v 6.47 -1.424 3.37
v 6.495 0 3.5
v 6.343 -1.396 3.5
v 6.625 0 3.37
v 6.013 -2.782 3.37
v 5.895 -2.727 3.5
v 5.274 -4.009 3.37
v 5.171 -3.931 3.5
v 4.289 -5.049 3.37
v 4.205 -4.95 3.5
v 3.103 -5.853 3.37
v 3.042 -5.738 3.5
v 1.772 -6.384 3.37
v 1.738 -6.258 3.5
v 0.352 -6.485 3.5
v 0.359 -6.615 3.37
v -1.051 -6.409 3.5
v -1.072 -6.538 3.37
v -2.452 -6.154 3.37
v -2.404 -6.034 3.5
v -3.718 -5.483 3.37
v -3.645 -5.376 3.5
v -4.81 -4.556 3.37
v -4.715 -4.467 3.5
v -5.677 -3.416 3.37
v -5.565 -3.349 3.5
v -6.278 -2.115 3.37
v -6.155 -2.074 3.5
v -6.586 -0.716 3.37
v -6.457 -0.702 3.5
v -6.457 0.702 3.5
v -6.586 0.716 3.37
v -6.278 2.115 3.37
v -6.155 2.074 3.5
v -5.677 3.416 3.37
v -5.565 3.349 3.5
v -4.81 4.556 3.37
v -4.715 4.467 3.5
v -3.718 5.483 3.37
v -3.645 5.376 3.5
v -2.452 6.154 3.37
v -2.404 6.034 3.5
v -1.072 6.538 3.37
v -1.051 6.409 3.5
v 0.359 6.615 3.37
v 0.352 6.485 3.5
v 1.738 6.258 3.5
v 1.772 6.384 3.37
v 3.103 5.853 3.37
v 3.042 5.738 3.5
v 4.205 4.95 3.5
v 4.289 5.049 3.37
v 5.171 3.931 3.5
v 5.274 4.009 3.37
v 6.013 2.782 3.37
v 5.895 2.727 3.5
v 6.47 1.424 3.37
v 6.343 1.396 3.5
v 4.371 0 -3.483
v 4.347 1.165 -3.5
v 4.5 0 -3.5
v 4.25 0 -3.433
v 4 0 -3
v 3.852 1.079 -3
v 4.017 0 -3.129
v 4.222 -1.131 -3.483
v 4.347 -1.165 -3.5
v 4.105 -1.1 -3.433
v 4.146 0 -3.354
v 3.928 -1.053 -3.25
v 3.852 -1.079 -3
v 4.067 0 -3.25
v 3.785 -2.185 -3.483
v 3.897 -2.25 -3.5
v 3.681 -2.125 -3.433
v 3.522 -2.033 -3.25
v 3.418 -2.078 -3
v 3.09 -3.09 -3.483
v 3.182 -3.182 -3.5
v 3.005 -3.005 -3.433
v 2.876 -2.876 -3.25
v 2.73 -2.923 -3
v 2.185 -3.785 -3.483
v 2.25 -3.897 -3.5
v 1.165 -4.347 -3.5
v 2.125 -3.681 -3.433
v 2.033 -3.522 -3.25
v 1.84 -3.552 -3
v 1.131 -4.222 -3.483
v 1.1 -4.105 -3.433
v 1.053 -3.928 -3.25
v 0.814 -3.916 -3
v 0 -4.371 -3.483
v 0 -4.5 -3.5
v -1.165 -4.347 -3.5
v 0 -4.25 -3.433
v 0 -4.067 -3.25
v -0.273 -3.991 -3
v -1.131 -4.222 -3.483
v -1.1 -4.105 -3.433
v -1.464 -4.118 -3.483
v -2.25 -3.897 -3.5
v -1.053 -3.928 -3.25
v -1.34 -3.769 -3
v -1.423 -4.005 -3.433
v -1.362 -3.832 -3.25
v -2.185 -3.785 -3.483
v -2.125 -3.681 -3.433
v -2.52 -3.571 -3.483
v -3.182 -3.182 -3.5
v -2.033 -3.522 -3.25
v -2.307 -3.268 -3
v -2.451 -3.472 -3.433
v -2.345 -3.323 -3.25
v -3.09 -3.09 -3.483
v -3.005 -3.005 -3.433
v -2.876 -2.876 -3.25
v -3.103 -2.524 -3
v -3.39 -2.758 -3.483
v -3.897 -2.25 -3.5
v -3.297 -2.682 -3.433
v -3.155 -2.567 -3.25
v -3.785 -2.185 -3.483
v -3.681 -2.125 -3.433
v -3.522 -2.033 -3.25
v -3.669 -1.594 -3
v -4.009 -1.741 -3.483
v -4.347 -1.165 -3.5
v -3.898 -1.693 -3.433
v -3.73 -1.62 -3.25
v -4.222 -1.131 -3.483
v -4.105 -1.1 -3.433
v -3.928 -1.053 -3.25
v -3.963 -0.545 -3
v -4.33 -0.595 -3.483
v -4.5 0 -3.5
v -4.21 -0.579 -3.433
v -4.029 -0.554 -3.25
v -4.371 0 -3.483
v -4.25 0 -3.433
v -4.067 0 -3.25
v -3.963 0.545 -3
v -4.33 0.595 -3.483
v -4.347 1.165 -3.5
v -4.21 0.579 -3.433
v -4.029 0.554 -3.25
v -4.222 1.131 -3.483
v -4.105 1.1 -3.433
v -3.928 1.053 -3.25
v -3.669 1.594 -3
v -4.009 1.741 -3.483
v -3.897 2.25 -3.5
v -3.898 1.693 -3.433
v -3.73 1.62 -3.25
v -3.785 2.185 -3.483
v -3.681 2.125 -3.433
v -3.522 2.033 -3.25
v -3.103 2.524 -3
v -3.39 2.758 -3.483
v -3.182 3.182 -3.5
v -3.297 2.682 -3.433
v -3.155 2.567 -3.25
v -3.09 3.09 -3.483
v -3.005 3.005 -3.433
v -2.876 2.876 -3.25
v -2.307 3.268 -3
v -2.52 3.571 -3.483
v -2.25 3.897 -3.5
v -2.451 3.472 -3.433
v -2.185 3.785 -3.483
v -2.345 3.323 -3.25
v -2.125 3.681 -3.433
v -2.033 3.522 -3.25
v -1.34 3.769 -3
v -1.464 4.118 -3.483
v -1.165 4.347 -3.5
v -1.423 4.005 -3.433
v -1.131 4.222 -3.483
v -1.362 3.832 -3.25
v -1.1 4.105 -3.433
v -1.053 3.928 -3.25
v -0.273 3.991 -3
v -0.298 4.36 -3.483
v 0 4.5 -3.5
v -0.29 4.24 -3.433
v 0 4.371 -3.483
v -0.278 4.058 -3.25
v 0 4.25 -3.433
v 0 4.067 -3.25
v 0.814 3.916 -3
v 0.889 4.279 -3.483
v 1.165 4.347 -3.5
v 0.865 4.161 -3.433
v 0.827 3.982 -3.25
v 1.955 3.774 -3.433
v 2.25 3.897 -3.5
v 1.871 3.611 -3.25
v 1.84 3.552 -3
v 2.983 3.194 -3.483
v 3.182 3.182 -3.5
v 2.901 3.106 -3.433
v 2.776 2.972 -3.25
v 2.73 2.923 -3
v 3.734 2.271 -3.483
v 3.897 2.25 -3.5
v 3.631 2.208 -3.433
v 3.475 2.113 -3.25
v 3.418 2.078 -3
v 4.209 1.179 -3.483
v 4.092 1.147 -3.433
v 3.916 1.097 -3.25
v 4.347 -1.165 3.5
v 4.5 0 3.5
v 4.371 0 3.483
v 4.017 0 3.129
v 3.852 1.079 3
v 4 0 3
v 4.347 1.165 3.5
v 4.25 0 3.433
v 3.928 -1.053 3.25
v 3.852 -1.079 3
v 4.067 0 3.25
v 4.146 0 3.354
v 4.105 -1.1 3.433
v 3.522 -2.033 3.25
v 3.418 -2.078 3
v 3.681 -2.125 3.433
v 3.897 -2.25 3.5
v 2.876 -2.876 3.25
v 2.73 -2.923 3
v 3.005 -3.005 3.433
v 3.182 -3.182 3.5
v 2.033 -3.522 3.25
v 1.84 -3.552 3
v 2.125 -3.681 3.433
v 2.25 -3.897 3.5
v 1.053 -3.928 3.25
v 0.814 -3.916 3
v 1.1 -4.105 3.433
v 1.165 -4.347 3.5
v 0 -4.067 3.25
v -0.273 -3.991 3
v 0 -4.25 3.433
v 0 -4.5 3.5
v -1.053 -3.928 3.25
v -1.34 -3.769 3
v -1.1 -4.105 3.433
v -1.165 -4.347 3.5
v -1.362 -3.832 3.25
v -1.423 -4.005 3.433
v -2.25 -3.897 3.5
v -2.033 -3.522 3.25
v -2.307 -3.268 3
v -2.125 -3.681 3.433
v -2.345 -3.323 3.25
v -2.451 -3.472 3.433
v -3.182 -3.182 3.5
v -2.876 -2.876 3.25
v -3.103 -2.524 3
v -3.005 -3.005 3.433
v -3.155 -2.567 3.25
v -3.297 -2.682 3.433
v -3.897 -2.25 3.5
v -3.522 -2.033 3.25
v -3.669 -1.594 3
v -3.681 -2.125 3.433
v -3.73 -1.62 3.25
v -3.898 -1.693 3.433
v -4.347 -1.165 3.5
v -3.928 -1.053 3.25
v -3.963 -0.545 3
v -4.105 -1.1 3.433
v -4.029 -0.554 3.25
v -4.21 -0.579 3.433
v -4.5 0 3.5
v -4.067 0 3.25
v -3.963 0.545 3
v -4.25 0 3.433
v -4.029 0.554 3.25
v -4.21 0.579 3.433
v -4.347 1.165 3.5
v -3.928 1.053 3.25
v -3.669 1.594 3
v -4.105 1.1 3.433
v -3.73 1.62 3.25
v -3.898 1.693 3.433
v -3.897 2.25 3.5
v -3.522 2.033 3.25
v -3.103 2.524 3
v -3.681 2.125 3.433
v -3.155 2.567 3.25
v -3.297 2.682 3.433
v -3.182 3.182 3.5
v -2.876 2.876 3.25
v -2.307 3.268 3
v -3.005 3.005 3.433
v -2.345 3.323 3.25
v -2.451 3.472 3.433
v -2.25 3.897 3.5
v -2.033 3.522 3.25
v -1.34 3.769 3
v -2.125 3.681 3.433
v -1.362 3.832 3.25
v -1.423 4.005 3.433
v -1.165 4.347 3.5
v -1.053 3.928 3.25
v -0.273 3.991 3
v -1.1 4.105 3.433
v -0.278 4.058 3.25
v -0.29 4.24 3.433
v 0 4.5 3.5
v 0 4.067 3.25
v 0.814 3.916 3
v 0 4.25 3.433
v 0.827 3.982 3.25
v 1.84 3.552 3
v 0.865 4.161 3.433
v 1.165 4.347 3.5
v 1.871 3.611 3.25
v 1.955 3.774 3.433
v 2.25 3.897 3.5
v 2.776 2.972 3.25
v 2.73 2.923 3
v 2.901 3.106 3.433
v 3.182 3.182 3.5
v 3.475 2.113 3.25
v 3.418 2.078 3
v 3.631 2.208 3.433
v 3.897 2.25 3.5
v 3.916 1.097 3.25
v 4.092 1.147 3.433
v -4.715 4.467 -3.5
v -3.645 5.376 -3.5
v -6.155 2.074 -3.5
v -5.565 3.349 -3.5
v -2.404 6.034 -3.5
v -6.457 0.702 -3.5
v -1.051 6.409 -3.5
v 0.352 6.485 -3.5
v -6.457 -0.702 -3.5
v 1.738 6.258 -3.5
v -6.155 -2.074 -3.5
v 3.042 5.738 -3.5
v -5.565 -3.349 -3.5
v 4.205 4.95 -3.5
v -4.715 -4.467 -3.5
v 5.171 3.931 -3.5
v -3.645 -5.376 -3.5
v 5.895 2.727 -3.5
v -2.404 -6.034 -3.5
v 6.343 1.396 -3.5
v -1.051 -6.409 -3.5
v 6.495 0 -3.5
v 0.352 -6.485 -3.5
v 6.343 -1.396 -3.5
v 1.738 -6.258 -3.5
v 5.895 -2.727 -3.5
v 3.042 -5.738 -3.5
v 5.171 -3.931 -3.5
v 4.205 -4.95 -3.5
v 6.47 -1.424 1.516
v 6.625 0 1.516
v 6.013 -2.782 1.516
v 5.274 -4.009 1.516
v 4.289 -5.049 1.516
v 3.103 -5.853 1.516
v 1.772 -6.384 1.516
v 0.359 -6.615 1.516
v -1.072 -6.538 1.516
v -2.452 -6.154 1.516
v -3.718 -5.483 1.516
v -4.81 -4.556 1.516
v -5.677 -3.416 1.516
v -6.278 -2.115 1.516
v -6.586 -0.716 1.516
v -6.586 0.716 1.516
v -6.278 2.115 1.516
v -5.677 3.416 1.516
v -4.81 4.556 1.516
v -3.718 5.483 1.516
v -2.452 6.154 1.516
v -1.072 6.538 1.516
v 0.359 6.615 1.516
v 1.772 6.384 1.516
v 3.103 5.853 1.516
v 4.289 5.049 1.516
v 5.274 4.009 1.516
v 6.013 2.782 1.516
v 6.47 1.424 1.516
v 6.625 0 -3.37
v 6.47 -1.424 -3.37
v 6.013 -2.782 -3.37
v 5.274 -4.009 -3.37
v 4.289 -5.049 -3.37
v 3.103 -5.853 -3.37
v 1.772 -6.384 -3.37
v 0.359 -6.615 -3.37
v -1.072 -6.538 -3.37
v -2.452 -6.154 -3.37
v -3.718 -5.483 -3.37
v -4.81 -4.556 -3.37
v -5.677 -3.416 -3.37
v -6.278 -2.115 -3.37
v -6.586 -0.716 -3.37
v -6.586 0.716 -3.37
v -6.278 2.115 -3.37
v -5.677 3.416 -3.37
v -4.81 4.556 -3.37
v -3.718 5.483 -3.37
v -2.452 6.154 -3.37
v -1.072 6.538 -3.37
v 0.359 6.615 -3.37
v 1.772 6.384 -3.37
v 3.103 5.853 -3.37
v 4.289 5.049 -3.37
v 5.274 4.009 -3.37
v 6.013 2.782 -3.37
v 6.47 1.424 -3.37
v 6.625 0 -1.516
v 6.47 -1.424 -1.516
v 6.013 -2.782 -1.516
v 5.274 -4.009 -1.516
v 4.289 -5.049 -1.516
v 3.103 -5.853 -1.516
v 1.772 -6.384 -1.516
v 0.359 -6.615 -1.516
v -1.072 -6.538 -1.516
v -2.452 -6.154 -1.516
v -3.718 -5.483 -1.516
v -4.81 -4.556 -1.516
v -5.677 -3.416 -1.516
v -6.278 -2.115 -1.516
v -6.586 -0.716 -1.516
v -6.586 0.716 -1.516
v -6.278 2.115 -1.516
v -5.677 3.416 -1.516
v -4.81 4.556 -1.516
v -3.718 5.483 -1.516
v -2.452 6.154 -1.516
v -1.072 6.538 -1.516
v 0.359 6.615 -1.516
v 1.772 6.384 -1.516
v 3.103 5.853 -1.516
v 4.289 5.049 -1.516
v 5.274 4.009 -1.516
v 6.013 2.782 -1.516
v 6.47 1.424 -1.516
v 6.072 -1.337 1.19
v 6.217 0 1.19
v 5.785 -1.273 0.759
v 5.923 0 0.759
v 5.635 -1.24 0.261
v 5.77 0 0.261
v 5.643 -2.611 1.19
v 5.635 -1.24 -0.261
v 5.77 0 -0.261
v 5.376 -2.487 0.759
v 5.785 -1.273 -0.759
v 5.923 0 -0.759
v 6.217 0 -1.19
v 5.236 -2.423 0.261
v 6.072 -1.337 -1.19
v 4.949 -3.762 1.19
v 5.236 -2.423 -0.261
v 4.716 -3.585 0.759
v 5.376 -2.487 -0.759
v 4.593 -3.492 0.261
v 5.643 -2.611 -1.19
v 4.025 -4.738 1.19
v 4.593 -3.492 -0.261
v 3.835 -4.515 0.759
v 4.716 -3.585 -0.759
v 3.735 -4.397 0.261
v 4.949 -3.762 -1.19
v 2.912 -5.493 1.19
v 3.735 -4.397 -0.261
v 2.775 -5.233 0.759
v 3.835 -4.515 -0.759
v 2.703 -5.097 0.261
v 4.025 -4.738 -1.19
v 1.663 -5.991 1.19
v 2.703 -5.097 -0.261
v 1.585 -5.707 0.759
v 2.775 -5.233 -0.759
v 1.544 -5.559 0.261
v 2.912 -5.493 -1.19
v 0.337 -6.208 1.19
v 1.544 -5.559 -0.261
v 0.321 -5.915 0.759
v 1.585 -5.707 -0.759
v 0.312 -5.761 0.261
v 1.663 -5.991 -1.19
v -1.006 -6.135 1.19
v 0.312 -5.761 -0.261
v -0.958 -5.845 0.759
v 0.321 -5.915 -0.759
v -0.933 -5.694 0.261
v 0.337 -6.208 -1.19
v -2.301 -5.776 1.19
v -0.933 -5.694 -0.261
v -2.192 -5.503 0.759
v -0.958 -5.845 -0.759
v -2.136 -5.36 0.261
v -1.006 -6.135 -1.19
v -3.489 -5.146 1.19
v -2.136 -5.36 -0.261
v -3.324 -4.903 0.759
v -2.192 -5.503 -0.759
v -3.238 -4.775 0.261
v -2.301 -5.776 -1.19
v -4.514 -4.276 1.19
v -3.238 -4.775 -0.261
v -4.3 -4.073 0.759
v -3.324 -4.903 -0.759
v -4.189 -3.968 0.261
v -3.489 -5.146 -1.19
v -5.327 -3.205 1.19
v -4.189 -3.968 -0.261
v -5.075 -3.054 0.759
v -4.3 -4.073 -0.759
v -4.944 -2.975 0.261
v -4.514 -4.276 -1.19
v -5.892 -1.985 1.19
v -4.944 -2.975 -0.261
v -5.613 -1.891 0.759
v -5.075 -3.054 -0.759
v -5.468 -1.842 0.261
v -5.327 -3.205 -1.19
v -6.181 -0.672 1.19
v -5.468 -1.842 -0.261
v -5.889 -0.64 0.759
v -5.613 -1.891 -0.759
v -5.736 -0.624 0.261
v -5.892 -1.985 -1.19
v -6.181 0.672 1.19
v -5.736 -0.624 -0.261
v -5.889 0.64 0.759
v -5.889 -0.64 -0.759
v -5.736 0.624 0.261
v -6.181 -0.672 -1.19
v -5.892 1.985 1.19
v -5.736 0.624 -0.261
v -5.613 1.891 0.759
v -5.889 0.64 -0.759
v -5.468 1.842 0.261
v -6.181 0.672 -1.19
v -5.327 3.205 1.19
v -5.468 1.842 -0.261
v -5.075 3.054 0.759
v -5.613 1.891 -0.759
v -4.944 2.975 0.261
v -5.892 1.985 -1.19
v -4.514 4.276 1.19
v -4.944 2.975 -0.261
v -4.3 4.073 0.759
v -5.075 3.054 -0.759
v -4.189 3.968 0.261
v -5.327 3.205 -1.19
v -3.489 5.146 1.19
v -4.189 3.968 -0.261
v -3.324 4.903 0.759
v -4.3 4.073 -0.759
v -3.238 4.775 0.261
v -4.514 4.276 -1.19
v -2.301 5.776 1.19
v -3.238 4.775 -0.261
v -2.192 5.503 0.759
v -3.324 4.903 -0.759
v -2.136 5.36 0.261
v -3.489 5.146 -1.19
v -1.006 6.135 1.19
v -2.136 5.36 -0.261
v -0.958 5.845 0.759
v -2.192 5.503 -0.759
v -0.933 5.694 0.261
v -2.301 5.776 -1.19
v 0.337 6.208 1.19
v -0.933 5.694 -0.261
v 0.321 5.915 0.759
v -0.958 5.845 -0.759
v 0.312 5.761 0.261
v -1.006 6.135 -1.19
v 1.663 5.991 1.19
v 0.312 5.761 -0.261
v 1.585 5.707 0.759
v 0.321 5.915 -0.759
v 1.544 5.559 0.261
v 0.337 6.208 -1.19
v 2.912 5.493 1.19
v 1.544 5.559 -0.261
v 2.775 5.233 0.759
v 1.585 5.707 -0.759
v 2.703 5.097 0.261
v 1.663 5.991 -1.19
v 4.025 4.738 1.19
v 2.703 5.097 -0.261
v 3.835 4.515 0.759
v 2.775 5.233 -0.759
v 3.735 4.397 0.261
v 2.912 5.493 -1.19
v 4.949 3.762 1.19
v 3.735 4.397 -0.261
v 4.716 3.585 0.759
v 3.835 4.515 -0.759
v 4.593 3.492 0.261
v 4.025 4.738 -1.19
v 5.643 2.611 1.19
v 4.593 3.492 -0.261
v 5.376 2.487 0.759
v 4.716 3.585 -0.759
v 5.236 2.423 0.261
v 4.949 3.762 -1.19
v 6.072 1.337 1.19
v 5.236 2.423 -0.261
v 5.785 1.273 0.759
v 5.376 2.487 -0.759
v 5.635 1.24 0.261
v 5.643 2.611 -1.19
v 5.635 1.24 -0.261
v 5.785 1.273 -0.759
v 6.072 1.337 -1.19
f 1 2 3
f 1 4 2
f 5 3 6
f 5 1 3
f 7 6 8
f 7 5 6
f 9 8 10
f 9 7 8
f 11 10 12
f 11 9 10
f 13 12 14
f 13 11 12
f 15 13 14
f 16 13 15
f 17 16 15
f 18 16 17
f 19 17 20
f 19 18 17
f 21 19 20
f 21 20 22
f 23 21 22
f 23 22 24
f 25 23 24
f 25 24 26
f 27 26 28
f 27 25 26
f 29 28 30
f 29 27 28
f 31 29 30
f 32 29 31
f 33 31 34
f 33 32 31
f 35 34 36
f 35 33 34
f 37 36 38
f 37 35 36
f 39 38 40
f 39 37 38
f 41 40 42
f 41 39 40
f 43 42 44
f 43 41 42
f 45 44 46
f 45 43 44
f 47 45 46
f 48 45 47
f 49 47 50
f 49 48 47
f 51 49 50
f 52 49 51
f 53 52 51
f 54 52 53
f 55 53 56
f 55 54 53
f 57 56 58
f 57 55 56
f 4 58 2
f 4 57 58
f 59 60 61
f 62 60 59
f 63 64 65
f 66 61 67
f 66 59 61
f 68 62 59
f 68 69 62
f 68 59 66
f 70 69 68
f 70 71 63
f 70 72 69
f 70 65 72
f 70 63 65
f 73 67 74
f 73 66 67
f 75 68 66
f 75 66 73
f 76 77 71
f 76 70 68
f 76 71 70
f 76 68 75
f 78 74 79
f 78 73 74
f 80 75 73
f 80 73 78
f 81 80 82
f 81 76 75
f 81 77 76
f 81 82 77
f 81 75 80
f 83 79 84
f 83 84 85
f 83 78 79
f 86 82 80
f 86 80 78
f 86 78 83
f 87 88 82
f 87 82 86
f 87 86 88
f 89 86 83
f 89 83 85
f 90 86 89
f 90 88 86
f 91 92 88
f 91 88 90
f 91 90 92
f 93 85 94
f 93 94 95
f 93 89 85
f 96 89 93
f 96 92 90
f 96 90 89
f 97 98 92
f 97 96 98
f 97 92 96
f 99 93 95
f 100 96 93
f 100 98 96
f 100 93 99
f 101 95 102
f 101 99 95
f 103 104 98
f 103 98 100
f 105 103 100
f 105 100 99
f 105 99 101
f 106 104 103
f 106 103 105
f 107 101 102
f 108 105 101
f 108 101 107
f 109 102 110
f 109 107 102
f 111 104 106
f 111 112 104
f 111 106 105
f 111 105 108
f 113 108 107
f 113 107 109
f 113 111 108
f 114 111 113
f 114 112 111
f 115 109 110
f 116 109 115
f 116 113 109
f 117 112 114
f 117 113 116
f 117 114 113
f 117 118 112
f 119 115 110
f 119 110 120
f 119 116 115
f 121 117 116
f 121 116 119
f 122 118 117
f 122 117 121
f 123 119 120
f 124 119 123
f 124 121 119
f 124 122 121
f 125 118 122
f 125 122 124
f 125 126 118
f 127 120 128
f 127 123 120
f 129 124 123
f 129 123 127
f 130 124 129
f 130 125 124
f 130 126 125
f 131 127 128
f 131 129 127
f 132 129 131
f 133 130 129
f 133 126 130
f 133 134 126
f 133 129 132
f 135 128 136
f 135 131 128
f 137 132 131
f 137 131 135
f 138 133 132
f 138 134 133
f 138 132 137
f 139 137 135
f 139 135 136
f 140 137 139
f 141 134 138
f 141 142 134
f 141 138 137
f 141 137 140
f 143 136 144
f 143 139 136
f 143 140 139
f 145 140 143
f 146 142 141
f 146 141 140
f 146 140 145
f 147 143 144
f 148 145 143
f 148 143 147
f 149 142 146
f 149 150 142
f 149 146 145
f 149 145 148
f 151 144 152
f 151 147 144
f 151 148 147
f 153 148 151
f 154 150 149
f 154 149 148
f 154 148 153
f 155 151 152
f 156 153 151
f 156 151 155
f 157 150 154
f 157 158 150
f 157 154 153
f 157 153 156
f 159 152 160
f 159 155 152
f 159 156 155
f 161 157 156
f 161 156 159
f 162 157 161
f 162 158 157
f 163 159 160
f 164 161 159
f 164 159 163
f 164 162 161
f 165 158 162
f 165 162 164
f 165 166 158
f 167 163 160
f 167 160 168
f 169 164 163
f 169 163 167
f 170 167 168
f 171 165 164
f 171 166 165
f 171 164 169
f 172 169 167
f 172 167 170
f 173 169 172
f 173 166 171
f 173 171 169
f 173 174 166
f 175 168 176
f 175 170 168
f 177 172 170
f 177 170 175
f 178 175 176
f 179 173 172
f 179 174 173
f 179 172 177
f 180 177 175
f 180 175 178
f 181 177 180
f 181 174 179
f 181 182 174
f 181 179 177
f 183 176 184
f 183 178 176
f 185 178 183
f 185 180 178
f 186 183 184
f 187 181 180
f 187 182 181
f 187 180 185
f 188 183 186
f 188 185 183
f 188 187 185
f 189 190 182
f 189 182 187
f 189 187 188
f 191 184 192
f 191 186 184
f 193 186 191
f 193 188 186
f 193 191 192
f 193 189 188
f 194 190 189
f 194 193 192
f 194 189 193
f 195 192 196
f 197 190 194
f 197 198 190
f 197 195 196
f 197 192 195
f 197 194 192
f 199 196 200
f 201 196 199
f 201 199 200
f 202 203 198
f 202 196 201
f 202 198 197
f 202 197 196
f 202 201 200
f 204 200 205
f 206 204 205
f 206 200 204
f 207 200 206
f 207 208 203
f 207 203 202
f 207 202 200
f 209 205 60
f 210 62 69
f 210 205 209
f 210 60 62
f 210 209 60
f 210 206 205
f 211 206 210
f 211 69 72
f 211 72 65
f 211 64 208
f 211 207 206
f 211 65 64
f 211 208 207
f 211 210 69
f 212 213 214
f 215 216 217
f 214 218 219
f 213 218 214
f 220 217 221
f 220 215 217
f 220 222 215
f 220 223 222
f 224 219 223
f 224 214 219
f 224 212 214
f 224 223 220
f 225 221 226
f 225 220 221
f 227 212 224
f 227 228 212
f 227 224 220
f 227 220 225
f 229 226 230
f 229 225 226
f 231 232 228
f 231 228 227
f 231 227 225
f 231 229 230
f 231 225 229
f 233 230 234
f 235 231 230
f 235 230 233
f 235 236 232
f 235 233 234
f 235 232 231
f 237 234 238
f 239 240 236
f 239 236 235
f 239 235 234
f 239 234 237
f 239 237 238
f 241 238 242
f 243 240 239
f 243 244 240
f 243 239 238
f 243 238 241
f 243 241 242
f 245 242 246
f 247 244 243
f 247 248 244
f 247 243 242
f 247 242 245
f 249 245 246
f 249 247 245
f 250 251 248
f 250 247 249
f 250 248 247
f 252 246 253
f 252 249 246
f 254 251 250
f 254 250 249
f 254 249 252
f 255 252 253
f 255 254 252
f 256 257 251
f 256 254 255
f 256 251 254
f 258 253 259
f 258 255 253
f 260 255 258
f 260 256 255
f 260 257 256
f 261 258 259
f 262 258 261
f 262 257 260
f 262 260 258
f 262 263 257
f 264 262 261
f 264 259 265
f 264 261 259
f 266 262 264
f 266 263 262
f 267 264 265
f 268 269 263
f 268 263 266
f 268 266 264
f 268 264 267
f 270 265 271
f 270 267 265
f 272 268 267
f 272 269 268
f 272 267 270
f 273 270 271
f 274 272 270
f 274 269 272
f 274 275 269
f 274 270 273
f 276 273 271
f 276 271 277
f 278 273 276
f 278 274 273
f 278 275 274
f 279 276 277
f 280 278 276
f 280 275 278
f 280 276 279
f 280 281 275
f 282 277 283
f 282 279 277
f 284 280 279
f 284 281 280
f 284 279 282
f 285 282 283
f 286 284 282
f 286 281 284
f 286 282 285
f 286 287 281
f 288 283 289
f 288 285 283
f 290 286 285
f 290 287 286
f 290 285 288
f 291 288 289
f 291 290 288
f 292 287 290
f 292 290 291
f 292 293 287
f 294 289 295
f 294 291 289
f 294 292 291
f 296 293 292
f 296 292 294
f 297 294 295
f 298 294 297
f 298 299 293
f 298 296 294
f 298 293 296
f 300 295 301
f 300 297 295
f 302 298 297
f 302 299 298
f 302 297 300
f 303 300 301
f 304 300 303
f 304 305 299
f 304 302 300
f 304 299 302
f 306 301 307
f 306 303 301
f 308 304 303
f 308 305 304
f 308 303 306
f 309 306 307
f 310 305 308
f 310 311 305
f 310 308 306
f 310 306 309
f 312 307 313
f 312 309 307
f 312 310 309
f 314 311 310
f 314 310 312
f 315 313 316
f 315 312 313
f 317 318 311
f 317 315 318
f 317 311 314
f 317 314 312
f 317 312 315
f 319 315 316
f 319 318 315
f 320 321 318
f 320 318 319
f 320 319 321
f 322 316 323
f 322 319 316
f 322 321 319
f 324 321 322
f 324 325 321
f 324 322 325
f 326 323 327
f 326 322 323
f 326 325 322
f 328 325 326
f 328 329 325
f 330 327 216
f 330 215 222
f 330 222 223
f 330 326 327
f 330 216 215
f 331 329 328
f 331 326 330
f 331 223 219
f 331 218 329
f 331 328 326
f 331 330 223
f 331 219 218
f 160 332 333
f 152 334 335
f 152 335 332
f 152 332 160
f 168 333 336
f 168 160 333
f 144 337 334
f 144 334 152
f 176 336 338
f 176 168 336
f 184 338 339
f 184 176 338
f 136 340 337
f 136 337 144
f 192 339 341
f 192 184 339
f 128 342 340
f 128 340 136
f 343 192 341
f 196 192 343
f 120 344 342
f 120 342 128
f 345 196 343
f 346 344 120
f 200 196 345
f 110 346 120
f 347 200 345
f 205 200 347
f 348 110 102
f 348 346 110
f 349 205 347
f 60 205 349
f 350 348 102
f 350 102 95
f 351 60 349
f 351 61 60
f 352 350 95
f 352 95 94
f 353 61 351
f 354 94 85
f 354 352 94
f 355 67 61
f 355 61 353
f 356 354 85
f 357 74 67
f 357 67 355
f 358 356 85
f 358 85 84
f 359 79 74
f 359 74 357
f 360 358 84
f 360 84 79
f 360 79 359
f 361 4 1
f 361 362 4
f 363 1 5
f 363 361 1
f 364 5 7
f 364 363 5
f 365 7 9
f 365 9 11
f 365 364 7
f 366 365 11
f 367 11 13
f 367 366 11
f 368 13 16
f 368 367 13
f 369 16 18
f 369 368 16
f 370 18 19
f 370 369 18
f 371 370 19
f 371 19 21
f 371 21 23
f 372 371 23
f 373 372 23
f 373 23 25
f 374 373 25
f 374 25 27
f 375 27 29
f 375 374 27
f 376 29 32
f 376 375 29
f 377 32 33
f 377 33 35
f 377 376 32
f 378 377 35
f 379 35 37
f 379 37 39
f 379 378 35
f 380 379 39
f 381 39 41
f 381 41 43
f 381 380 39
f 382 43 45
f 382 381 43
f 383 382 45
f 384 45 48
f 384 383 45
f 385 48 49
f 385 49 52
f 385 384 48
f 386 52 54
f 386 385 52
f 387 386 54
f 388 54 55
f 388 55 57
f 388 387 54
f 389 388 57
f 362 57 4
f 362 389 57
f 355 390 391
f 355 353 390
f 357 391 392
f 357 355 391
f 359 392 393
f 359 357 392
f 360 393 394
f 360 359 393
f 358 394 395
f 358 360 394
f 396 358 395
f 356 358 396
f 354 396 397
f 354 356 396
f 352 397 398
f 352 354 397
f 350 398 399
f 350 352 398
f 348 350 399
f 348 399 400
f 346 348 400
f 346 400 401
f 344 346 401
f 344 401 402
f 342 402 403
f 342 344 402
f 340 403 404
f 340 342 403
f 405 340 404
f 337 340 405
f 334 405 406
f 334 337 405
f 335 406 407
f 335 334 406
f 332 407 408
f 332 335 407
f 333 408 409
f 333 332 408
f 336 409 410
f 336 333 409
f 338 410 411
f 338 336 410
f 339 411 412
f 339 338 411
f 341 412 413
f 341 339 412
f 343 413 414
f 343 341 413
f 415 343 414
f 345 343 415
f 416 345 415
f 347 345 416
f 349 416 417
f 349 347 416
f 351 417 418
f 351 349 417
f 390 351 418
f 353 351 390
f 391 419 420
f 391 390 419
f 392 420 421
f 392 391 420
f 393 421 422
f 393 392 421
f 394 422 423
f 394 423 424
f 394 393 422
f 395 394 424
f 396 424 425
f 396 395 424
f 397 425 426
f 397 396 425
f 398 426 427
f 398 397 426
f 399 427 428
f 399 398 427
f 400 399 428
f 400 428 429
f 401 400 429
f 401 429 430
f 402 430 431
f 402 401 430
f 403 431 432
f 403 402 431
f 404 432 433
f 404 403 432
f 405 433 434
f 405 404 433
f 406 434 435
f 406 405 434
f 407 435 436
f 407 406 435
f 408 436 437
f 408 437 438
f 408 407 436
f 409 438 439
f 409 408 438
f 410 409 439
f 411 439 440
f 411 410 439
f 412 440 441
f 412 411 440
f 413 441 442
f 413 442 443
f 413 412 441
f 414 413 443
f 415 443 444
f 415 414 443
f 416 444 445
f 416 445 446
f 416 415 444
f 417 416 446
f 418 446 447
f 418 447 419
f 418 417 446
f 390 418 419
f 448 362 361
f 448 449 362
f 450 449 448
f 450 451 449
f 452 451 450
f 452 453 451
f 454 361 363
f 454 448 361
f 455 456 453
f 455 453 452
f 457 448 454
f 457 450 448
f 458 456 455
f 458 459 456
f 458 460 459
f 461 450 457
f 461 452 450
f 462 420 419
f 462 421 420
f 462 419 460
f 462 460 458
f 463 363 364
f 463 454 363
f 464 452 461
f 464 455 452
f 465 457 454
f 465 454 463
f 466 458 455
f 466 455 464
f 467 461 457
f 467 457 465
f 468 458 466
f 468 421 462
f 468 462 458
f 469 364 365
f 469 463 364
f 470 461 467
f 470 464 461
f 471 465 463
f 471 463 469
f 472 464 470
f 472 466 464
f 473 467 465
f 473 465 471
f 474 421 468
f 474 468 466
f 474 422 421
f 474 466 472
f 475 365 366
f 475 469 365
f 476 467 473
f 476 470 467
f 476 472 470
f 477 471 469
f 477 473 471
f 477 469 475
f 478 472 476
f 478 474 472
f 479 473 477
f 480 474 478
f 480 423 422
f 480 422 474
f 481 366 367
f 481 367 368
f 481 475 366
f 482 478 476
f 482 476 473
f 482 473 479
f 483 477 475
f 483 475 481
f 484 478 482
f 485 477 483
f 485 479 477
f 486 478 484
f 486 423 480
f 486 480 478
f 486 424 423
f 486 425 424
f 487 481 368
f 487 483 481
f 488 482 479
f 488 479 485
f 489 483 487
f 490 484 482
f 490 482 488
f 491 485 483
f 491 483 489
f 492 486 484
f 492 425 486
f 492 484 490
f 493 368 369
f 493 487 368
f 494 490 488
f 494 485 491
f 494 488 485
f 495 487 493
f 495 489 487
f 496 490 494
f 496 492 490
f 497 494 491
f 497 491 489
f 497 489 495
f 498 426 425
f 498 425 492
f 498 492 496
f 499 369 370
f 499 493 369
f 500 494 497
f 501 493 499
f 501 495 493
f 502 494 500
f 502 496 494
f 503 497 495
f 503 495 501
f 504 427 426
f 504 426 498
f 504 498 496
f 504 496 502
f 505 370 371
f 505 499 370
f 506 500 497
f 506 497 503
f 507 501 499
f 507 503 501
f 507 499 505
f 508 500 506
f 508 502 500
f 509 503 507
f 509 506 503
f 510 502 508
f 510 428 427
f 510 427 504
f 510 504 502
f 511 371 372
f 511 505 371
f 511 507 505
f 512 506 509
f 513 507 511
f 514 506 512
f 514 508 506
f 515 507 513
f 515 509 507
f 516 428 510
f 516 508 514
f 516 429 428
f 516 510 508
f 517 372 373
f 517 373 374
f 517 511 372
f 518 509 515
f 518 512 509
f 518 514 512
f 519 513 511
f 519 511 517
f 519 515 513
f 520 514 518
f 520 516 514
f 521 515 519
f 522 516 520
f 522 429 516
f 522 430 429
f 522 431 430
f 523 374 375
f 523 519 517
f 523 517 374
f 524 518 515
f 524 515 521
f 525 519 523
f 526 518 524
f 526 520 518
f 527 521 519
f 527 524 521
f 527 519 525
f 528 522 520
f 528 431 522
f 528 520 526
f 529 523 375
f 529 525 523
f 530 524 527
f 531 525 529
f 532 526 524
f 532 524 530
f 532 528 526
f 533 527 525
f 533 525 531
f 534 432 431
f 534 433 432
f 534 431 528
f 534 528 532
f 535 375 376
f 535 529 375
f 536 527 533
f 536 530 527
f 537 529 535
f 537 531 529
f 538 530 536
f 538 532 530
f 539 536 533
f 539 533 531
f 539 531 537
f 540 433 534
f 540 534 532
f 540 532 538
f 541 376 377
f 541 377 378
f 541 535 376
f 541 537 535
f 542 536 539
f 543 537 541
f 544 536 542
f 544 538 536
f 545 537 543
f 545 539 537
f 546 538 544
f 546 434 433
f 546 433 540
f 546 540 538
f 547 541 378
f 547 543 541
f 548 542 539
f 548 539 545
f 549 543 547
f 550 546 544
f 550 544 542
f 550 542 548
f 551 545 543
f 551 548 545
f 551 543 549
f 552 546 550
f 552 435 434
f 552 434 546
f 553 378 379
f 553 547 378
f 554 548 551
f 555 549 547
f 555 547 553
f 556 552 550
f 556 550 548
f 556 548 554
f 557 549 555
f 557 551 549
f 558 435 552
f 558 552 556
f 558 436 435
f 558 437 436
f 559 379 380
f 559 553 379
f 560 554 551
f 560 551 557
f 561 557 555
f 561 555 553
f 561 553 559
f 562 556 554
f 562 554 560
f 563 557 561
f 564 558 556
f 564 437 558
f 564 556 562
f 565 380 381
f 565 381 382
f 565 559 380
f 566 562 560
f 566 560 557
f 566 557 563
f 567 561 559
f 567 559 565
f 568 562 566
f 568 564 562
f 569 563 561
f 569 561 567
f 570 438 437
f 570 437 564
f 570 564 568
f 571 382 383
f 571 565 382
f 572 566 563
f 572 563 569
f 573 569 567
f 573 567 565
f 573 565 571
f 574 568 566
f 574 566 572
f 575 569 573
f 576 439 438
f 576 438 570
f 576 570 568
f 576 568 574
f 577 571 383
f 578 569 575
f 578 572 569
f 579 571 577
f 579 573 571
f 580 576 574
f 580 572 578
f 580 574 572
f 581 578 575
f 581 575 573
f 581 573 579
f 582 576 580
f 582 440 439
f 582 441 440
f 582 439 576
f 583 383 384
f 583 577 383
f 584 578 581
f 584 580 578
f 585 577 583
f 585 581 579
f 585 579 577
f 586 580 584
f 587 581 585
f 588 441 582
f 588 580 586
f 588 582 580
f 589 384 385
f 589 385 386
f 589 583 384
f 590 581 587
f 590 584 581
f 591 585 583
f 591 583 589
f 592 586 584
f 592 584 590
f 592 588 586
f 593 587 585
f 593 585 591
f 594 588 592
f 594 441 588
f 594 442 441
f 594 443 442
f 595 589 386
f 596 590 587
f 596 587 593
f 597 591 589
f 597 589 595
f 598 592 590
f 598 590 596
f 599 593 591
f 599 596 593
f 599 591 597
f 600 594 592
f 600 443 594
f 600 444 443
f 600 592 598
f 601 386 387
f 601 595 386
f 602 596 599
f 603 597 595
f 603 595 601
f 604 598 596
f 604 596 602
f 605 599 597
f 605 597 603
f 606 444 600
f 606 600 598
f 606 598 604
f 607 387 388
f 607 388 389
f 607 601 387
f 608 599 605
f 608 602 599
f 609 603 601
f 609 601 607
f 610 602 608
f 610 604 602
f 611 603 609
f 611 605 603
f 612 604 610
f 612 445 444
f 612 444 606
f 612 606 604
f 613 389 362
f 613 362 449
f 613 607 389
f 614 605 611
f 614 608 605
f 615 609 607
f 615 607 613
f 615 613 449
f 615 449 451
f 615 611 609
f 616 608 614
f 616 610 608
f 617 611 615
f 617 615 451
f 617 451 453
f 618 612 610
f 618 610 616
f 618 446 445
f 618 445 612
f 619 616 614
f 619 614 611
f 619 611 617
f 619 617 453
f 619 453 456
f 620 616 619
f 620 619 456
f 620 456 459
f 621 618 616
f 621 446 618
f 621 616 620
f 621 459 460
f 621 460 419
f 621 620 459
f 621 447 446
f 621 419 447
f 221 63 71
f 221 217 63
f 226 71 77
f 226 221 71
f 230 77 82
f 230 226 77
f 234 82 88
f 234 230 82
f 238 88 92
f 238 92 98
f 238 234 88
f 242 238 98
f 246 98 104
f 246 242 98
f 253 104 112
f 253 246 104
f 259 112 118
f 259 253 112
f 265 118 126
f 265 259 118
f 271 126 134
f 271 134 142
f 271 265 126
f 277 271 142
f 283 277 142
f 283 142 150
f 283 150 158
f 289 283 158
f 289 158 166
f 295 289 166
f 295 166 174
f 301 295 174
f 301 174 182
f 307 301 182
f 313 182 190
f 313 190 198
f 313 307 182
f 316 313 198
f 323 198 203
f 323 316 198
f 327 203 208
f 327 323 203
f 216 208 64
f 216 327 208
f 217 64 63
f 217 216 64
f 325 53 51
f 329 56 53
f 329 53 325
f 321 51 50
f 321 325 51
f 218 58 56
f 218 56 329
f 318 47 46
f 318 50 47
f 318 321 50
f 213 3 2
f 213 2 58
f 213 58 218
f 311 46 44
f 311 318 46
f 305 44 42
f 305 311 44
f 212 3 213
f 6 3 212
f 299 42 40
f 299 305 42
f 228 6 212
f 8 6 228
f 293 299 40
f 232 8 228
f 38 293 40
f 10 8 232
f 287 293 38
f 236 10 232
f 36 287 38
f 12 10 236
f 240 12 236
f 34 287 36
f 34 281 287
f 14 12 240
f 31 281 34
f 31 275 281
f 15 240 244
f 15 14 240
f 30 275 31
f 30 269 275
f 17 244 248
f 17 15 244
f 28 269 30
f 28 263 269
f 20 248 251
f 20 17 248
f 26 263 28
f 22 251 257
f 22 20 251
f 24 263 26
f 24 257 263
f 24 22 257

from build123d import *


with BuildPart() as part:
    # Sketch2 → Revolve1 (revolve)
    with BuildSketch(Plane(origin=(0, 0, 0), x_dir=(0, 0, -1), z_dir=(1, 0, 0)), mode=Mode.PRIVATE) as revolve1_sk:
        with BuildLine():
            Line((3, 4), (-3, 4))
            ThreePointArc((-3, 4), (-3.353553391, 4.146446609), (-3.5, 4.5))
            Line((-3.5, 4.5), (-3.5, 6.495))
            Line((-3.5, 6.495), (-3.37, 6.625))
            Line((-3.37, 6.625), (-1.515544457, 6.625))
            ThreePointArc((-1.515544457, 6.625), (0, 5.75), (1.515544457, 6.625))
            Line((1.515544457, 6.625), (3.37, 6.625))
            Line((3.37, 6.625), (3.5, 6.495))
            Line((3.5, 6.495), (3.5, 4.5))
            ThreePointArc((3.5, 4.5), (3.353553391, 4.146446609), (3, 4))
        make_face()
    revolve(revolve1_sk.sketch.rotate(Axis((0, 0, 3.5), (0, 0, -1)), 90), axis=Axis((0, 0, 3.5), (0, 0, -1)))


solid = part.part
